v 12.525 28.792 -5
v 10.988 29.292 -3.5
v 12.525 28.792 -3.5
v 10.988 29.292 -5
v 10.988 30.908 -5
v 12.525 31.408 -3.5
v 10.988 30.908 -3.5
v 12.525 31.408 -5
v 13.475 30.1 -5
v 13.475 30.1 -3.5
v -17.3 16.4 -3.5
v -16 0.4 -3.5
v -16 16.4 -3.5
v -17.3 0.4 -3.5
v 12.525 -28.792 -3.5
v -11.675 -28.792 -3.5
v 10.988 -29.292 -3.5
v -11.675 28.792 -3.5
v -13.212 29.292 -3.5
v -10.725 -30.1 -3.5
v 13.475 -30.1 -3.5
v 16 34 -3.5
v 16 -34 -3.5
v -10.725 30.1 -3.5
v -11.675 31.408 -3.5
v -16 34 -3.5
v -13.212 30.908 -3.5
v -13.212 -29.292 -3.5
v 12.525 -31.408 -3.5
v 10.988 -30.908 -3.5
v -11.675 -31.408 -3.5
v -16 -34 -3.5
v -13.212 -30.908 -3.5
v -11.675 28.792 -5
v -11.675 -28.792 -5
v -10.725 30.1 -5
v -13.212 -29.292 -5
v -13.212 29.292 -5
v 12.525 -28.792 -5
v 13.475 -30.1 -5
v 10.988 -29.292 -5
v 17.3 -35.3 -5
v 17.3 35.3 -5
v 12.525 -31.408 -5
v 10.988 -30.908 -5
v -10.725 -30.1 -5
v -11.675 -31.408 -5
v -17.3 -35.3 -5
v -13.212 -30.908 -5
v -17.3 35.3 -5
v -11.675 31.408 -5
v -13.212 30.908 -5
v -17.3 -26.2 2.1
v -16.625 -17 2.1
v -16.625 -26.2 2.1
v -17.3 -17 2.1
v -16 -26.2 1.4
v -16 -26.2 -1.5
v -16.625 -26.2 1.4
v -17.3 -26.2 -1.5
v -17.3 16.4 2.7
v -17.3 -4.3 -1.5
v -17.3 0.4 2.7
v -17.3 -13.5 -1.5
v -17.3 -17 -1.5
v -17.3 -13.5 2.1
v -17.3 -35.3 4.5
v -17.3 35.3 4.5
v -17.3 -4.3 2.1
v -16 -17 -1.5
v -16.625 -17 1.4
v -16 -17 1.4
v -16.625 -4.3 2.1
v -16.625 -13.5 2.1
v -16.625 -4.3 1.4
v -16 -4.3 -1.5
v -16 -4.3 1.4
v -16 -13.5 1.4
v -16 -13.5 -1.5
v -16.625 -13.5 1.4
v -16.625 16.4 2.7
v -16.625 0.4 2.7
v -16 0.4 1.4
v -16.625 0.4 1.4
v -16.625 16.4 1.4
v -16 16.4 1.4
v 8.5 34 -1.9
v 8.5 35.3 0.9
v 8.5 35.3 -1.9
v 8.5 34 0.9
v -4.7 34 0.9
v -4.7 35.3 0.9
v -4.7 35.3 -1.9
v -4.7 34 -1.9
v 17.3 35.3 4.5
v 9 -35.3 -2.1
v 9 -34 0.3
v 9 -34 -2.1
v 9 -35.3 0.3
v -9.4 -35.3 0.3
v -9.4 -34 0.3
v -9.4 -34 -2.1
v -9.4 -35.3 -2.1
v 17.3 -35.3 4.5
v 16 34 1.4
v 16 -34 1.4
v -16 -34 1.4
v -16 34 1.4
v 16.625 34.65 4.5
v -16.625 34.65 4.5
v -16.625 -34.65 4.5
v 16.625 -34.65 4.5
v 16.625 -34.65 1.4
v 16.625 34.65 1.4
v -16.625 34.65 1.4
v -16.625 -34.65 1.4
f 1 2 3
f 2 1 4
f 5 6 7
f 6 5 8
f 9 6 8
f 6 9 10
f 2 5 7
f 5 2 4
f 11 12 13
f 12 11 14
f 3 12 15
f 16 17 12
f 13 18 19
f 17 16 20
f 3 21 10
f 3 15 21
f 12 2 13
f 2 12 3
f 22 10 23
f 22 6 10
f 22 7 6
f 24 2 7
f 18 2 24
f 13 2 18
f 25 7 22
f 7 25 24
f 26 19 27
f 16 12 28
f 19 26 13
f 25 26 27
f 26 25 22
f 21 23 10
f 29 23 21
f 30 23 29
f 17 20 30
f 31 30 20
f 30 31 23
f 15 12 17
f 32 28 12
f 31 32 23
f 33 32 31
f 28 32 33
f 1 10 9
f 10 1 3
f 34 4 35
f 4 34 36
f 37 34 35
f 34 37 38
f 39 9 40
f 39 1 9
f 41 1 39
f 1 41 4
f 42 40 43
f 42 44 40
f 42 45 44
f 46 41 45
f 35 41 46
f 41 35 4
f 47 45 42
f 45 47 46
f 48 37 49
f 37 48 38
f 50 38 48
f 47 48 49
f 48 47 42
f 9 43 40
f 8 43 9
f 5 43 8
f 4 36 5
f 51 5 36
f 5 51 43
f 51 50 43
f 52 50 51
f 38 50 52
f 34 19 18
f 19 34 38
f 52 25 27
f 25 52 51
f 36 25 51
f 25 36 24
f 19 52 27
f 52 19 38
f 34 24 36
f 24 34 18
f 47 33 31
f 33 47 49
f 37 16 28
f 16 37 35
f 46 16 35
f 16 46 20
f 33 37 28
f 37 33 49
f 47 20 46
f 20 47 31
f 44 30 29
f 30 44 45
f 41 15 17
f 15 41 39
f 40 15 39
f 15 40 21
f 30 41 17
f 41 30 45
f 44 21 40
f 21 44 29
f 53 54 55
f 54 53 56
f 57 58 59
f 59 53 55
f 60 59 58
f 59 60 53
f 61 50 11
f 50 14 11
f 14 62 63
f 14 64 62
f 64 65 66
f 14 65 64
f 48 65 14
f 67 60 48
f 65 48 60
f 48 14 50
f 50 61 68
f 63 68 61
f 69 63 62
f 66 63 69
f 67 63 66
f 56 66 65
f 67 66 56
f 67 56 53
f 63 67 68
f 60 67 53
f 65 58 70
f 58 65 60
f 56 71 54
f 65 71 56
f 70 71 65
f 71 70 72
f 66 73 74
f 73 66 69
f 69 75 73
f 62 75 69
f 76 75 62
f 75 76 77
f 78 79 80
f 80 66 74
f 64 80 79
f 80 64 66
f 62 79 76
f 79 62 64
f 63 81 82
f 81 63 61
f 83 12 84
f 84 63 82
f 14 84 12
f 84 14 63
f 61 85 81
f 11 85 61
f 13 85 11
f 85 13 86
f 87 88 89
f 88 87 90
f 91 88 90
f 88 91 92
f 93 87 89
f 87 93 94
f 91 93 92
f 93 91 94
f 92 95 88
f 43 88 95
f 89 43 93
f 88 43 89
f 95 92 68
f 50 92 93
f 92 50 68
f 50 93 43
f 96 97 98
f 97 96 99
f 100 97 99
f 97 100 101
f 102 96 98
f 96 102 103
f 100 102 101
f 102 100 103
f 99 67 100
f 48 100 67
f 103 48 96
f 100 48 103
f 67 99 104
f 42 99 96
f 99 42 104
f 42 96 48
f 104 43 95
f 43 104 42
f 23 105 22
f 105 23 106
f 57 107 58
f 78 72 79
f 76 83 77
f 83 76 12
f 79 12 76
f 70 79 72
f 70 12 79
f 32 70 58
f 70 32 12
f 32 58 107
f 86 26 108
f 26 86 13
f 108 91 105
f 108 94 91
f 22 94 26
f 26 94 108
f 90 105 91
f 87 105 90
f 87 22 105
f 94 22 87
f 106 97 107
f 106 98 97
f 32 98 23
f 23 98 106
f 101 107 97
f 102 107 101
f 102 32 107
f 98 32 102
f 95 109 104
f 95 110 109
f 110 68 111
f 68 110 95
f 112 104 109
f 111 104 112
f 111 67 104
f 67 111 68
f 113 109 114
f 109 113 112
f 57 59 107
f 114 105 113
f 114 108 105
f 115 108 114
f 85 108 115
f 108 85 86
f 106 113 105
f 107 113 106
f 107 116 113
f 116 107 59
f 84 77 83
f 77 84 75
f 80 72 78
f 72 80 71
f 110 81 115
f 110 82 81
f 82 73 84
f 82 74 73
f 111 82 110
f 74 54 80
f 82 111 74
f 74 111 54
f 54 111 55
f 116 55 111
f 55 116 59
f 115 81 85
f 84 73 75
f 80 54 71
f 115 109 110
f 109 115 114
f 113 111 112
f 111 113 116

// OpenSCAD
// GENERAL VALUES
WALL            = 1.5;
RIM_HEIGHT      = 3;
RIM_GAP         = [0.3, 0.4, 0.4];
LID_HEIGHT      = WALL + 2;

// RASPBERRY PI VALUES
PI_DIM              = [31.2, 67.2, 7];
PI_PADDING          = [0.4,0.4,0];
PI_HOLE             = [3.5,3.5,0];
PI_HOLE_RADIUS      = 2.75/2;
PI_SCREWHOLE_RADIUS = 2.5;
PI_SCREWHOLE_DEPTH  = 10;
PI_CASE             = PI_DIM + PI_PADDING + [2 * WALL, 2 * WALL, 2 * WALL];

PI_USB1_DIM         = [9.2, WALL, 3.6];
PI_USB2_DIM         = [9.2, WALL, 3.6];
PI_HDMI_DIM         = [16, WALL, 6.2];
PI_SDCARD_DIM       = [13.2, WALL, 2.8];
PI_CAMERA_DIM       = [18.4, WALL, 2.4];
PI_GPIO_DIM         = [8,52,WALL];

// CAMERA VALUES
CAM_DIM             = [5,5,3];
CAM_PADDING         = [0.4,0.4,0];
CAM_CASE            = CAM_DIM + CAM_PADDING + 2 * [WALL,WALL,WALL];


// WHAT TO RENDER
pi_case_bottom();
//pi_case_top();


module pi_case(){
    difference(){
        cube(PI_CASE, center = true);
        cube(PI_DIM + 2 * PI_PADDING, center = true);
        pi_mounts();
        pi_openings();
    }
}

module pi_lid_mask_small(){
    // LID 
    translate([0,0, PI_CASE[2]/2 - (LID_HEIGHT - RIM_HEIGHT)/2])
        cube([PI_CASE[0],
              PI_CASE[1],
              LID_HEIGHT - RIM_HEIGHT],
              center = true);

    // RIM1
    translate([0,0, PI_CASE[2]/2 - RIM_HEIGHT/2 - (LID_HEIGHT - RIM_HEIGHT)])
        cube([PI_CASE[0] - WALL,
              PI_CASE[1] - WALL,
              RIM_HEIGHT] - RIM_GAP/2,
              center = true);
}

module pi_lid_mask_big(){
    // LID 
    translate([0,0, PI_CASE[2]/2 - (LID_HEIGHT - RIM_HEIGHT)/2])
        cube([PI_CASE[0],
              PI_CASE[1],
              LID_HEIGHT - RIM_HEIGHT],
              center = true);
    
    // RIM2
    translate([0,0, PI_CASE[2]/2 - RIM_HEIGHT/2 - (LID_HEIGHT - RIM_HEIGHT)])
        cube([PI_CASE[0] - WALL,
              PI_CASE[1] - WALL,
              RIM_HEIGHT] + RIM_GAP/2,
              center = true);
}

module pi_case_bottom(){
    difference(){
        pi_case();
        pi_lid_mask_big();
    }
}

module pi_case_top(){
    intersection(){
        pi_case();
        pi_lid_mask_small();
    }
}

module pi_hole(){
    translate([])
        cylinder(WALL,
                 PI_HOLE_RADIUS,
                 PI_HOLE_RADIUS,
                 center = true);
}



module pi_mounts(){
    PI_MOUNT_OFFSET_X = PI_DIM[0]/2 - PI_HOLE[0];
    PI_MOUNT_OFFSET_Y = PI_DIM[1]/2 - PI_HOLE[1];

    translate([0,0,- PI_CASE[2]/2 + WALL/2]) {
        // back right mount
        translate([PI_MOUNT_OFFSET_X,
                   PI_MOUNT_OFFSET_Y,
                   0]) pi_hole();
        
        // back left mount
        translate([- PI_MOUNT_OFFSET_X,
                   PI_MOUNT_OFFSET_Y,
                   0]) pi_hole();
        
        // front left mount
        translate([- PI_MOUNT_OFFSET_X,
                   - PI_MOUNT_OFFSET_Y,
                   0]) pi_hole();

        // front right mount
        translate([PI_MOUNT_OFFSET_X,
                   - PI_MOUNT_OFFSET_Y,
                   0]) pi_hole();
    }
}

module pi_openings(){
    PI_USB1_LOC   = [- PI_CASE[0]/2 + WALL/2,
                   - PI_DIM[1]/2 + PI_USB1_DIM[0]/2 + 7.4,
                   - PI_CASE[2]/2 + PI_USB1_DIM[2]/2 +  
                     WALL + PI_PADDING[2] + 2];

    PI_USB2_LOC   = [- PI_CASE[0]/2 + WALL/2,
                   - PI_DIM[1]/2 + PI_USB2_DIM[0]/2 + 20.1,
                   - PI_CASE[2]/2 + PI_USB2_DIM[2]/2 +  
                     WALL + PI_PADDING[2] + 2];

    PI_HDMI_LOC   = [- PI_CASE[0]/2 + WALL/2,
                   - PI_DIM[1]/2 + PI_HDMI_DIM[0]/2 + 34,
                   - PI_CASE[2]/2 + PI_HDMI_DIM[2]/2 +  
                     WALL + PI_PADDING[2]];
                     
    PI_SDCARD_LOC = [- PI_DIM[0]/2 + PI_SDCARD_DIM[0]/2 + 10.9,
                    + PI_CASE[1]/2 - WALL/2,
                    - PI_CASE[2]/2 + PI_SDCARD_DIM[2]/2 + 
                     WALL + PI_PADDING[2] + 1.6];

    PI_CAMERA_LOC = [- PI_DIM[0]/2 + PI_CAMERA_DIM[0]/2 + 6.2,
                    - PI_CASE[1]/2 + WALL/2,
                    - PI_CASE[2]/2 + PI_CAMERA_DIM[2]/2 + 
                     WALL + PI_PADDING[2] + 1.4];
                     
    PI_GPIO_LOC   = [PI_DIM[0]/2 - PI_GPIO_DIM[0]/2,
                     0,
                     PI_CASE[2]/2 - WALL/2 ];
    
    translate(PI_USB1_LOC)
        rotate ([0,0,90])
            cube(PI_USB1_DIM, center = true);

    translate(PI_USB2_LOC)
        rotate ([0,0,90])
            cube(PI_USB2_DIM, center = true);

    translate(PI_HDMI_LOC)
        rotate ([0,0,90])
            cube(PI_HDMI_DIM, center = true);

    translate(PI_SDCARD_LOC)
        cube(PI_SDCARD_DIM, center = true);

    translate(PI_CAMERA_LOC)
        cube(PI_CAMERA_DIM, center = true);
    
    translate(PI_GPIO_LOC)
        cube(PI_GPIO_DIM, center = true);
}
